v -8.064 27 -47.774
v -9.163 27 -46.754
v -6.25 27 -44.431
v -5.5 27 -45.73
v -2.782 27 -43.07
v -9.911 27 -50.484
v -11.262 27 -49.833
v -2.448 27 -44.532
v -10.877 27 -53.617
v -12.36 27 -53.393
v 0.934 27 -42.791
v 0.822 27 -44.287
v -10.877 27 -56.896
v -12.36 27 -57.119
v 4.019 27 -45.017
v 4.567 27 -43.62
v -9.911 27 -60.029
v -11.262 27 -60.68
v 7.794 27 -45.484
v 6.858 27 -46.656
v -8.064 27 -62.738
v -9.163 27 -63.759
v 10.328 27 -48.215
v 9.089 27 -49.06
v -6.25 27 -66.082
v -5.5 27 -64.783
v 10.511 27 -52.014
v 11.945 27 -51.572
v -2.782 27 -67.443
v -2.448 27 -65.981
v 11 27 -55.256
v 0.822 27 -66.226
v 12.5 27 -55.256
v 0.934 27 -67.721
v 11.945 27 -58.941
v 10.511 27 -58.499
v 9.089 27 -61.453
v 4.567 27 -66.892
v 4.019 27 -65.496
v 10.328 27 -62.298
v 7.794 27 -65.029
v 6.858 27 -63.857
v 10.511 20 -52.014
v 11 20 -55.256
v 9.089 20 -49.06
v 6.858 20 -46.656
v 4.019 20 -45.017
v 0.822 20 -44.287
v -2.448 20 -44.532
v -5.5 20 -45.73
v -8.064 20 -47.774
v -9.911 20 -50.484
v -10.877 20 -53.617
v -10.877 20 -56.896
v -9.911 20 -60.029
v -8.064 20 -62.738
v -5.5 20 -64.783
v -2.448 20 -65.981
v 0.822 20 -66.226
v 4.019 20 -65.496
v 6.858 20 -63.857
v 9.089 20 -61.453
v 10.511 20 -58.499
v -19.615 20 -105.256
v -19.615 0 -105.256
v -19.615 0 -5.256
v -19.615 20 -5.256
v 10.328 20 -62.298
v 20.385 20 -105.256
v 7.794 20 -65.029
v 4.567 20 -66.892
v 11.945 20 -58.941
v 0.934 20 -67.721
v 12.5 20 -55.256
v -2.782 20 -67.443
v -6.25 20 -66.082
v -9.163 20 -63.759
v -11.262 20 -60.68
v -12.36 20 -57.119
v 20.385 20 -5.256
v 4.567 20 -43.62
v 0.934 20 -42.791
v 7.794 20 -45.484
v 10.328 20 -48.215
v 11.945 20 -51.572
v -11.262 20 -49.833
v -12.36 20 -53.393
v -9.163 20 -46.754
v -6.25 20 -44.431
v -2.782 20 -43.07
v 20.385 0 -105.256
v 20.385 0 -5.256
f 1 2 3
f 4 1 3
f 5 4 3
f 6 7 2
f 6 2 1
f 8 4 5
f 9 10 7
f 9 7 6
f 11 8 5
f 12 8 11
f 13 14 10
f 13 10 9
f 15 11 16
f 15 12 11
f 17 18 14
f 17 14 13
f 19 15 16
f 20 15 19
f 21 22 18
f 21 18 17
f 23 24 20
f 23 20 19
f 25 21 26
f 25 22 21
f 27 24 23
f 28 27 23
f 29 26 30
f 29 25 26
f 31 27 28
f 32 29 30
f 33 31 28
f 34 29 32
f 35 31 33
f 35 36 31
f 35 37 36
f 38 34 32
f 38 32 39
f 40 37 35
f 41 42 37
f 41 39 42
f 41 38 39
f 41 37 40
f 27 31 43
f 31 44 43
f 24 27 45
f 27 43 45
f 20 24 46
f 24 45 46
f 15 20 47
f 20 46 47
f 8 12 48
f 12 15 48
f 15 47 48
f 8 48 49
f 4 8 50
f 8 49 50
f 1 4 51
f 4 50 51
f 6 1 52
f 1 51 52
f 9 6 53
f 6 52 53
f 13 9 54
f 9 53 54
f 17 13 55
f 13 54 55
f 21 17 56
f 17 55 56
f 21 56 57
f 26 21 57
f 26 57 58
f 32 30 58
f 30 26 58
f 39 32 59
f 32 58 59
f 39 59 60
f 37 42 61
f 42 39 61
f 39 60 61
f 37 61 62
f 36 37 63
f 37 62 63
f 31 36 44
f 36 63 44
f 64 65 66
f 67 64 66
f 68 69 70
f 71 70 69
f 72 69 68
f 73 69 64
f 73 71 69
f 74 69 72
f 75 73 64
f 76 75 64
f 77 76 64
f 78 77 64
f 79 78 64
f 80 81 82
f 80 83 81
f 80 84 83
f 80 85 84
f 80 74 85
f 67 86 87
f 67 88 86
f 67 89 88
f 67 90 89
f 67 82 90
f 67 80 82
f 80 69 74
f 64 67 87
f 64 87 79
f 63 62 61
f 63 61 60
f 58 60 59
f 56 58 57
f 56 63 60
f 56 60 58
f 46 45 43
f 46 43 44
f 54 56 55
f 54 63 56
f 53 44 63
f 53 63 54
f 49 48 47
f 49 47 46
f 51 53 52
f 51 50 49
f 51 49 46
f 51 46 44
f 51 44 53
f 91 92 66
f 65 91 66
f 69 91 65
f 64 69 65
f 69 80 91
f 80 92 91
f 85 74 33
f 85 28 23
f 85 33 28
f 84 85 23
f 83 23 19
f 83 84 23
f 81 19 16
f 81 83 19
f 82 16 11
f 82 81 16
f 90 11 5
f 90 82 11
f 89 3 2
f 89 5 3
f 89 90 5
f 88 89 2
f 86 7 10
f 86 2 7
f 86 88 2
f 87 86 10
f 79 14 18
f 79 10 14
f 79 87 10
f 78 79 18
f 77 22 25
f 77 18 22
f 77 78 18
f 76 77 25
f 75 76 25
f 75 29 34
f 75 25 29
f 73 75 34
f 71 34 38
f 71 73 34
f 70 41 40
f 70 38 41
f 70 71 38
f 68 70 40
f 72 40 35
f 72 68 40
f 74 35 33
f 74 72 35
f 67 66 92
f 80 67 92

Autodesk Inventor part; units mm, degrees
ref_plane "YZ Plane" through (0, 0, 0) normal (1, 0, 0) x (0, 1, 0)
ref_plane "XZ Plane" through (0, 0, 0) normal (0, 1, 0) x (-1, 0, 0)
ref_plane "XY Plane" through (0, 0, 0) normal (0, 0, 1) x (1, 0, 0)
sketch "Esboço1" plane through (0, 0, 0) normal (0, 1, 0) x (-1, 0, 0)
  line L0 (19.6154, -5.2564) -> (-20.3846, -5.2564)
  line L1 (-20.3846, -5.2564) -> (-20.3846, -105.2564)
  line L2 (-20.3846, -105.2564) -> (19.6154, -105.2564)
  line L3 (19.6154, -105.2564) -> (19.6154, -5.2564)
  point P0 (0, 0)
  dimension "d0" = 40
  dimension "d4" = 100
extrude "Extrusão1" add sketch "Esboço1" along normal blind 20
sketch "Esboço2" plane through (0, 20, 0) normal (0, 1, 0) x (1, 0, 0)
  circle A0 centre (0, 55.2564) radius 12.5
  circle A1 centre (0, 55.2564) radius 11
  line L0 (20.3846, 105.2564) -> (-19.6154, 105.2564) projected
  point P0 (0, 0)
  dimension "d11" = 22
  dimension "d12" = 25
  dimension "d13" = 50
extrude "Extrusão2" add sketch "Esboço2" along normal blind 7
sketch "Esboço3" plane through (0, 0, 0) normal (0, -1, 0) x (1, 0, 0)
  circle A0 centre (0.3846, -25.2576) radius 2.5
  circle A1 centre (0, -85.2564) radius 2.5
  line L0 (20.3846, -105.2564) -> (-19.6154, -105.2564) projected
  line L1 (20.3846, -5.2564) -> (20.3846, -105.2564) projected
  point P0 (0, 0)
  dimension "d16" = 5
  dimension "d17" = 5
  dimension "d18" = 60
  dimension "d19" = 20
  dimension "d20" = 20
properties part number "Suporte para estrutura" material "ABS plástico"
